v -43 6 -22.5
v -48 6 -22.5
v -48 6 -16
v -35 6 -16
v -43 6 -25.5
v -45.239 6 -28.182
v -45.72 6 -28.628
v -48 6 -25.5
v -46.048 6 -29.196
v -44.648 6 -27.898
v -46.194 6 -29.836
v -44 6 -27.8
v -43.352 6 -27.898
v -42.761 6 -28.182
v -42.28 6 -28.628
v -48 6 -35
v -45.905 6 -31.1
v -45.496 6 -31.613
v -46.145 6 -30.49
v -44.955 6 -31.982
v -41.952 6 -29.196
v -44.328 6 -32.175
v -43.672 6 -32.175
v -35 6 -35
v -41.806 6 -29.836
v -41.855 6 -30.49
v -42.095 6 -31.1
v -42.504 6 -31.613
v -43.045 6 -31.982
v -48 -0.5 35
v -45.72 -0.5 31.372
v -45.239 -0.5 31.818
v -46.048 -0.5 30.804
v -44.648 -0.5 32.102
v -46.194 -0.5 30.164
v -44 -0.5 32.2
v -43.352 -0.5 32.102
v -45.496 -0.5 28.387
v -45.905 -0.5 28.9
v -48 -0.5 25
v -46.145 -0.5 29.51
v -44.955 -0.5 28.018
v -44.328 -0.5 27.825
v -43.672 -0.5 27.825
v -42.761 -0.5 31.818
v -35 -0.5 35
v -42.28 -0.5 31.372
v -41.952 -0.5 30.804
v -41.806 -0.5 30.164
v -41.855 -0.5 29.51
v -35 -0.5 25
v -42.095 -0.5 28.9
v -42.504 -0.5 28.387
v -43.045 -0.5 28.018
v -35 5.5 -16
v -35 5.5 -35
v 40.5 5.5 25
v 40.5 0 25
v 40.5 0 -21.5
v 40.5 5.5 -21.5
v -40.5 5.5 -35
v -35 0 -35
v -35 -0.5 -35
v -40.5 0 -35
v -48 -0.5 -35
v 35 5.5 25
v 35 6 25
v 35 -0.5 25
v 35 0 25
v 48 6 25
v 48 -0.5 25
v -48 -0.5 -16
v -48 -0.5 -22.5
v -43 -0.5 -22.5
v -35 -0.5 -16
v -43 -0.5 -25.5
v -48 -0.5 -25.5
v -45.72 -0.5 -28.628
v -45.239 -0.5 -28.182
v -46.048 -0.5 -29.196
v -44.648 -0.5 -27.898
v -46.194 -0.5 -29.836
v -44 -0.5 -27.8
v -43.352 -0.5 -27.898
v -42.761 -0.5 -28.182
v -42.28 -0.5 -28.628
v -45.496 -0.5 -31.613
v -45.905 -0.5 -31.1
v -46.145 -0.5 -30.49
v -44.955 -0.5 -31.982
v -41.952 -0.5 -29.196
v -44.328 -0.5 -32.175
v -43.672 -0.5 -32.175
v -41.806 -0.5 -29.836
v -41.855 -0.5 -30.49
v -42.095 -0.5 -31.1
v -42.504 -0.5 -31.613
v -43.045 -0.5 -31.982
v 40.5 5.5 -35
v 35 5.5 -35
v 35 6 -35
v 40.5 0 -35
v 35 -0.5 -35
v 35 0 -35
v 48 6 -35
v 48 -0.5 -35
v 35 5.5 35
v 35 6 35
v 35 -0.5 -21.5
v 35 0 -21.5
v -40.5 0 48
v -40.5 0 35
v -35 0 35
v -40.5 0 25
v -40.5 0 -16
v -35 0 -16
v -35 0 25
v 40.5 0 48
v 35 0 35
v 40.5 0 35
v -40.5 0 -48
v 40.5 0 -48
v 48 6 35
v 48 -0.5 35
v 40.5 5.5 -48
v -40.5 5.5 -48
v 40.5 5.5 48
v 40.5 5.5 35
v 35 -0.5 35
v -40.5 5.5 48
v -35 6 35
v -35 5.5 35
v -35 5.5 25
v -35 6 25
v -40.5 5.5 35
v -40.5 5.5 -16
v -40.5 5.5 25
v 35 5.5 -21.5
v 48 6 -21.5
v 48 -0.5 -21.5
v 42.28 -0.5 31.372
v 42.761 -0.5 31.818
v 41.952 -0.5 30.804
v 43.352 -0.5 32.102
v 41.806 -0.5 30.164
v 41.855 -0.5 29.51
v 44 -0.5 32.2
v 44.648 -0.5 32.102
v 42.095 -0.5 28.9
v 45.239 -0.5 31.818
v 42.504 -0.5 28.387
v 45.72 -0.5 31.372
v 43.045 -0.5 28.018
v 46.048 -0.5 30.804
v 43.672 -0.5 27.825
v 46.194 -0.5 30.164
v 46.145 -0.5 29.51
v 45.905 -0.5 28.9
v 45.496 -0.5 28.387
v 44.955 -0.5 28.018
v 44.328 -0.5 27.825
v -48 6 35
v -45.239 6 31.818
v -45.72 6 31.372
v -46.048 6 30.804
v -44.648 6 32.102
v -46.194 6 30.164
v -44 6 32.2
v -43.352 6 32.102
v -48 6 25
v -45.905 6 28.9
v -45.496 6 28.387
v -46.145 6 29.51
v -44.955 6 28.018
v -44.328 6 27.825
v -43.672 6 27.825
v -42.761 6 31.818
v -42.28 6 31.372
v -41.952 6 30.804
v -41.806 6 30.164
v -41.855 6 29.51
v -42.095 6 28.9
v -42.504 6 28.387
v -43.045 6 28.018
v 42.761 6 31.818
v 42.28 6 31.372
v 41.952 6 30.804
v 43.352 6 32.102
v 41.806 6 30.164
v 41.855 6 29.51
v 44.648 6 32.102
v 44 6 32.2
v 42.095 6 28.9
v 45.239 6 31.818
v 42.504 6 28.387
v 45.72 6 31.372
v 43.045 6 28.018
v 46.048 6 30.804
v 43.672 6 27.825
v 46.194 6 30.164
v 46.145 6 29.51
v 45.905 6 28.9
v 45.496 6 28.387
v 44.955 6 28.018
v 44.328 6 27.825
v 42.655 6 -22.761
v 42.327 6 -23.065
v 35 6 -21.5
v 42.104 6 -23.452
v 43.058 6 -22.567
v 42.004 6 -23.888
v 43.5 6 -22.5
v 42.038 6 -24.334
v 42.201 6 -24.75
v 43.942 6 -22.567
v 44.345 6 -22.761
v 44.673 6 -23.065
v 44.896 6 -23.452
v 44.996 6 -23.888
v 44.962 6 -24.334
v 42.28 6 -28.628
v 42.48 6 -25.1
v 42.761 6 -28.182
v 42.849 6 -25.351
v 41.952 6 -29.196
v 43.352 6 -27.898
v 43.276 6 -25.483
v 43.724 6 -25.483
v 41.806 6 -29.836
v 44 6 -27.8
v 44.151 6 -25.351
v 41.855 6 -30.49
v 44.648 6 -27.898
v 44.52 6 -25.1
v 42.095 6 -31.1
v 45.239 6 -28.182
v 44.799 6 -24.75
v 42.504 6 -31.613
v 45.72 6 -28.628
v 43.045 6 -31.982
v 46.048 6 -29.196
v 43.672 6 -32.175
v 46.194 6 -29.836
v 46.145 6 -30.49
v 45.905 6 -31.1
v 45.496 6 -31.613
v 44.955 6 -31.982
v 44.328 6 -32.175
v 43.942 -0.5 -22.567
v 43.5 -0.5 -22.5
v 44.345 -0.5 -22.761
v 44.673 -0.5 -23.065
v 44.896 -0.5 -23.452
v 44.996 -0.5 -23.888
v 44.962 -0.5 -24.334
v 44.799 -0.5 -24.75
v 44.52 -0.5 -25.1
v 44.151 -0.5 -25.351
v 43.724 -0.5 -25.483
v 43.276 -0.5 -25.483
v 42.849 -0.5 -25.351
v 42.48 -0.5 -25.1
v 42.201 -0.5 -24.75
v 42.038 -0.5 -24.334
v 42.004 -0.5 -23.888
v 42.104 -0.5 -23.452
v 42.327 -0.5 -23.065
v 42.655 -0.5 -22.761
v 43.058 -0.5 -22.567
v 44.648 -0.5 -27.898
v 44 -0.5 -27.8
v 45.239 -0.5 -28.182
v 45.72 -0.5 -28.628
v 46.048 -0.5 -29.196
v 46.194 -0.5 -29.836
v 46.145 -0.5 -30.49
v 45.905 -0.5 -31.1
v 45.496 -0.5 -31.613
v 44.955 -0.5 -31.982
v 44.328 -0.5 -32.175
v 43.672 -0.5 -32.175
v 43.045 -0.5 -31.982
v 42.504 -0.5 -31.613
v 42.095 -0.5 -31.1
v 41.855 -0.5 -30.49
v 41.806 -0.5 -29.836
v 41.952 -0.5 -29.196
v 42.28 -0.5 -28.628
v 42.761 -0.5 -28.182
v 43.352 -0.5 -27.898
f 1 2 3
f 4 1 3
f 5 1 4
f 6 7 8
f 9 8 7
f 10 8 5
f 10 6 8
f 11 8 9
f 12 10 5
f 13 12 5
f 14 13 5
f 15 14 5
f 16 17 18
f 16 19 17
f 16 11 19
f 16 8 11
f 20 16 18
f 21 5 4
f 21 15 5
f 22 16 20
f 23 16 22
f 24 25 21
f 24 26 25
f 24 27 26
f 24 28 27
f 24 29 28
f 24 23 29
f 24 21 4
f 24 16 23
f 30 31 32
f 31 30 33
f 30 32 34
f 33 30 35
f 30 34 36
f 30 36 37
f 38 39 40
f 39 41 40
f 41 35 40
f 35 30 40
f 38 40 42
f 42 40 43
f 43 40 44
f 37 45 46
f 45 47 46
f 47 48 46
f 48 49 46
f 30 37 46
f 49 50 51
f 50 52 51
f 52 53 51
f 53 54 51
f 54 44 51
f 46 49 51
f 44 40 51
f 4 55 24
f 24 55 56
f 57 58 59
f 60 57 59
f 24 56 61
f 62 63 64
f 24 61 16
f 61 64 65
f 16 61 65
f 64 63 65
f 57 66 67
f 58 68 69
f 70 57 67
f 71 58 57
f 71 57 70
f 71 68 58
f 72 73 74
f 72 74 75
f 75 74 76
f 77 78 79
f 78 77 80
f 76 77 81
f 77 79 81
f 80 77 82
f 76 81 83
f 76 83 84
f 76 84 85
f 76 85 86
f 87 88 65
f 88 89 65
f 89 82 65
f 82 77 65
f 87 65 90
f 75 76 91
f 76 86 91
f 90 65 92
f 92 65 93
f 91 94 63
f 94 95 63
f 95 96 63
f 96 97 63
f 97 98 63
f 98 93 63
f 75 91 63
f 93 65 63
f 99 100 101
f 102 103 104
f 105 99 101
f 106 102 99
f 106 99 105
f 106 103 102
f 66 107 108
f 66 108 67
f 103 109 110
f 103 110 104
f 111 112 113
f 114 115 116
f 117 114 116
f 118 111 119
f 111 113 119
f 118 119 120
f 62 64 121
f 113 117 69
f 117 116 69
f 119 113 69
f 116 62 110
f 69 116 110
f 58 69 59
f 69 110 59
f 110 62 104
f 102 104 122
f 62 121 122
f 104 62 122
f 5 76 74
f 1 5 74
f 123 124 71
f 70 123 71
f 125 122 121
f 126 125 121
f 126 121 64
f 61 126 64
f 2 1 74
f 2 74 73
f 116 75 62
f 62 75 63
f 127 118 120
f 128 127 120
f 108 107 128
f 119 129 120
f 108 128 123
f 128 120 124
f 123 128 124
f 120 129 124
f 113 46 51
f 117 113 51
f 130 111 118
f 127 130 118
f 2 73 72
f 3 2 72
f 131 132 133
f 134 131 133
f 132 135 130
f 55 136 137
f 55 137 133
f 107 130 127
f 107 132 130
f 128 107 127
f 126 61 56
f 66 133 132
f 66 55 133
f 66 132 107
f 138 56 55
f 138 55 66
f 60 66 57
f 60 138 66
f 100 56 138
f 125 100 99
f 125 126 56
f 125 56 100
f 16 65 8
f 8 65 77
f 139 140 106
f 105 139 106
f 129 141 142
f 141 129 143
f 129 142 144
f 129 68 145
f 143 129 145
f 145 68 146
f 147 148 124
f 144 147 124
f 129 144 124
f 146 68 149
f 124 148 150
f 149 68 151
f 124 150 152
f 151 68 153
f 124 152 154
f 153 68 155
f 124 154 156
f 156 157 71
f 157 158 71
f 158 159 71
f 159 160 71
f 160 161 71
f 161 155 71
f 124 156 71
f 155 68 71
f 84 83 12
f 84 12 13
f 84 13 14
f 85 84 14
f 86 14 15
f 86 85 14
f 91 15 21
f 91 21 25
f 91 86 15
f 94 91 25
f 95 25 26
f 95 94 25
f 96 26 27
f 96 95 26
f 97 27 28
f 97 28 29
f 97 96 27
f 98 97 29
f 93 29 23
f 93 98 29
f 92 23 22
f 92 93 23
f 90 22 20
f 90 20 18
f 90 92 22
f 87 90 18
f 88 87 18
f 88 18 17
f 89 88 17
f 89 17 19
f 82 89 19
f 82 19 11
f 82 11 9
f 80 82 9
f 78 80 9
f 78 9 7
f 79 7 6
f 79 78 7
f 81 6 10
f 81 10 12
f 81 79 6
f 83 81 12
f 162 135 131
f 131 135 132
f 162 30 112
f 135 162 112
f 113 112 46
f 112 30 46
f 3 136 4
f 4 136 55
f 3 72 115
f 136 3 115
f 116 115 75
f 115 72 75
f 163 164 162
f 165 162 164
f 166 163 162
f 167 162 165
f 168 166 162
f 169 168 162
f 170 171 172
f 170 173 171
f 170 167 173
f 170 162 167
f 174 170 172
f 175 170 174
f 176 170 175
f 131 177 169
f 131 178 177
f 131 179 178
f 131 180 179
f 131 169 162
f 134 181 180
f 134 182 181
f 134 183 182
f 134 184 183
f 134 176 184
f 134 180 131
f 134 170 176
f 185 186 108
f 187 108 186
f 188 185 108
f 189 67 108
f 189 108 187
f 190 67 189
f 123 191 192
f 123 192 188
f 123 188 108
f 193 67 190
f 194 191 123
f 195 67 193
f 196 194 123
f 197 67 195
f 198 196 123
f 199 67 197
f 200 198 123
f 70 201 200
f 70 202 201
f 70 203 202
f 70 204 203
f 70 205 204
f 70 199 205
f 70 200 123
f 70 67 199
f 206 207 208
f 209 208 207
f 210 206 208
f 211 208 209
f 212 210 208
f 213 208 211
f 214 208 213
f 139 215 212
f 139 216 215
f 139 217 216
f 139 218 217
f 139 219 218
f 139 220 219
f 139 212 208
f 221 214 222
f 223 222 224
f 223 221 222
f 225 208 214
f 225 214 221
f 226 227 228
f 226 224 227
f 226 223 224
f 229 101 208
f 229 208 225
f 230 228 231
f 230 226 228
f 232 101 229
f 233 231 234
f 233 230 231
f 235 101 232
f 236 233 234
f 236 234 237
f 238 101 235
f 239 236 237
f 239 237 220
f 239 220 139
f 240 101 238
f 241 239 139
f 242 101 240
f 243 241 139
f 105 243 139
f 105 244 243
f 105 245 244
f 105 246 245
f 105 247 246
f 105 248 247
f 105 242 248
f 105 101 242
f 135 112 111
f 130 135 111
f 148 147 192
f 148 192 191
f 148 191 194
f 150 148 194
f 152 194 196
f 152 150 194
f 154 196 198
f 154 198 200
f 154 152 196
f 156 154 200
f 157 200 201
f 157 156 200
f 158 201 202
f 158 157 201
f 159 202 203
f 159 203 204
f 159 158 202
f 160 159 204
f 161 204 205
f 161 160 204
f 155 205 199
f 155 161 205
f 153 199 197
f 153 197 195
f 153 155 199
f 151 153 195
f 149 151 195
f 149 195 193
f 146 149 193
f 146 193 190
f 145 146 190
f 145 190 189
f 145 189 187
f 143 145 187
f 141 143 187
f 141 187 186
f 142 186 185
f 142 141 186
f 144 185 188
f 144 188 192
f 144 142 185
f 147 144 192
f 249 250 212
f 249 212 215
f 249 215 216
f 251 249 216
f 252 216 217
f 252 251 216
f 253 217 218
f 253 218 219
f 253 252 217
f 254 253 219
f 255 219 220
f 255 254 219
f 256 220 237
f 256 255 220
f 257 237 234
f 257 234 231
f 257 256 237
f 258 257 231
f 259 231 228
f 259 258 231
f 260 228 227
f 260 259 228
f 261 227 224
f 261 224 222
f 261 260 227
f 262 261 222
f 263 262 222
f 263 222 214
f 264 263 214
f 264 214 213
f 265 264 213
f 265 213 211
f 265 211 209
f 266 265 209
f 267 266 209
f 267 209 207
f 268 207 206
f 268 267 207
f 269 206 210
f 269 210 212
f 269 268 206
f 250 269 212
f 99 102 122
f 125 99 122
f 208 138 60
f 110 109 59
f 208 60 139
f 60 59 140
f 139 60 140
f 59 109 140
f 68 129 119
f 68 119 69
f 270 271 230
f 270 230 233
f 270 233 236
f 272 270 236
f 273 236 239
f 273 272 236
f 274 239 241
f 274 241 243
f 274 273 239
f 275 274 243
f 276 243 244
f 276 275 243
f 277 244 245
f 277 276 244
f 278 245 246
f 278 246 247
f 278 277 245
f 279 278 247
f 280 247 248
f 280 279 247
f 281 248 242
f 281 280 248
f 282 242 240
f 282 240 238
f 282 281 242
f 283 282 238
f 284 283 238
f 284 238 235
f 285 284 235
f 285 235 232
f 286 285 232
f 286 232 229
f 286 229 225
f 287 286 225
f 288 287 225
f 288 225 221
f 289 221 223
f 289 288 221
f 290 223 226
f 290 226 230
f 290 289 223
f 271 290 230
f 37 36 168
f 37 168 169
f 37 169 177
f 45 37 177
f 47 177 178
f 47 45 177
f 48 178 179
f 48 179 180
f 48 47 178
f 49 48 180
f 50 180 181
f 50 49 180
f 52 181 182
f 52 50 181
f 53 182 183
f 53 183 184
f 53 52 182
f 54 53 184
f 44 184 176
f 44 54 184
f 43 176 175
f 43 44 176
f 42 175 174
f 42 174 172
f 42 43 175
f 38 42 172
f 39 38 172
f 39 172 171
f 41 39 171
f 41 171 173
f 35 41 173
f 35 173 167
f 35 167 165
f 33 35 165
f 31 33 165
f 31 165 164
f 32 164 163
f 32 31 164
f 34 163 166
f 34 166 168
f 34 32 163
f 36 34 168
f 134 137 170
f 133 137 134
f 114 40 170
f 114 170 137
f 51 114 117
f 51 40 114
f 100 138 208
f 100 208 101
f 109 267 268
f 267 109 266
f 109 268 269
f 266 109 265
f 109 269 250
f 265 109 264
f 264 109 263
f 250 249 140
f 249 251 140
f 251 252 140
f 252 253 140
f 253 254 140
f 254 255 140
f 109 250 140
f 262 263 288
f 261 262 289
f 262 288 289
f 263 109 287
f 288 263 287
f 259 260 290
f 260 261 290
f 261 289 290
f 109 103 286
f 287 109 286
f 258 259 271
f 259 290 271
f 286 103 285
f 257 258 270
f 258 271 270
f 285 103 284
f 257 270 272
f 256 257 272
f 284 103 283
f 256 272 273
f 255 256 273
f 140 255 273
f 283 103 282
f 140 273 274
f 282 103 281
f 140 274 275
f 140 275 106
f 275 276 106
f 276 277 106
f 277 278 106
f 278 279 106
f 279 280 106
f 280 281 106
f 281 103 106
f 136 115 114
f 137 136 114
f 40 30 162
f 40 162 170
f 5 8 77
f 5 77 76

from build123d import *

# Parameters (mm, degrees)
EXTRUDE_3_DEPTH      = 5.5
EXTRUDE_4_DEPTH      = 6
EXTRUDE_4_DEPTH_BACK = 0.5
SKETCH_5_W           = 13
SKETCH_5_H           = 10
SKETCH_5_R           = 2.2
SKETCH_5_H_2         = 13.5
SKETCH_5_R_2         = 1.5


with BuildPart() as part:
    # Эскиз4 → Бобышка-Вытянуть3 (new body)
    with BuildSketch(Plane(origin=(0, 0, 0), x_dir=(1, 0, 0), z_dir=(0, 1, 0))):
        Polygon((-40.5, -48), (40.5, -48), (40.5, -35), (35, -35), (35, -25), (40.5, -25), (40.5, 21.5), (35, 21.5), (35, 35), (40.5, 35), (40.5, 48), (-40.5, 48), (-40.5, 35), (-35, 35), (-35, 16), (-40.5, 16), (-40.5, -25), (-35, -25), (-35, -35), (-40.5, -35), align=None)
    extrude(amount=EXTRUDE_3_DEPTH)

    # Эскиз5 → Бобышка-Вытянуть4 (add, two sides: drawn at the far end of the back side and taken through both)
    # profile 1 of 4: a face of its own
    with BuildSketch(Plane(origin=(0, 0, 0), x_dir=(1, 0, 0), z_dir=(0, 1, 0)).offset(-EXTRUDE_4_DEPTH_BACK)):
        with Locations((41.5, -30)):
            Rectangle(SKETCH_5_W, SKETCH_5_H)
        with Locations(Location((44, -30, 0), (0, 0, 270))):
            Circle(SKETCH_5_R, mode=Mode.SUBTRACT)
    # profile 2 of 4: a face of its own
    with BuildSketch(Plane(origin=(0, 0, 0), x_dir=(1, 0, 0), z_dir=(0, 1, 0)).offset(-EXTRUDE_4_DEPTH_BACK)):
        with Locations((-41.5, -30)):
            Rectangle(SKETCH_5_W, SKETCH_5_H)
        with Locations(Location((-44, -30, 0), (0, 0, 270))):
            Circle(SKETCH_5_R, mode=Mode.SUBTRACT)
    # profile 3 of 4: a face of its own
    with BuildSketch(Plane(origin=(0, 0, 0), x_dir=(1, 0, 0), z_dir=(0, 1, 0)).offset(-EXTRUDE_4_DEPTH_BACK)):
        with Locations((41.5, 28.25)):
            Rectangle(SKETCH_5_W, SKETCH_5_H_2)
        with Locations(Location((44, 30, 0), (0, 0, 270))):
            Circle(SKETCH_5_R, mode=Mode.SUBTRACT)
        with Locations(Location((43.5, 24, 0), (0, 0, 270))):
            Circle(SKETCH_5_R_2, mode=Mode.SUBTRACT)
    # profile 4 of 4: a face of its own
    with BuildSketch(Plane(origin=(0, 0, 0), x_dir=(1, 0, 0), z_dir=(0, 1, 0)).offset(-EXTRUDE_4_DEPTH_BACK)):
        Polygon((-48, 16), (-35, 16), (-35, 35), (-48, 35), (-48, 25.5), (-43, 25.5), (-43, 22.5), (-48, 22.5), align=None)
        with Locations(Location((-44, 30, 0), (0, 0, 270))):
            Circle(SKETCH_5_R, mode=Mode.SUBTRACT)
    extrude(amount=EXTRUDE_4_DEPTH + EXTRUDE_4_DEPTH_BACK)


solid = part.part
